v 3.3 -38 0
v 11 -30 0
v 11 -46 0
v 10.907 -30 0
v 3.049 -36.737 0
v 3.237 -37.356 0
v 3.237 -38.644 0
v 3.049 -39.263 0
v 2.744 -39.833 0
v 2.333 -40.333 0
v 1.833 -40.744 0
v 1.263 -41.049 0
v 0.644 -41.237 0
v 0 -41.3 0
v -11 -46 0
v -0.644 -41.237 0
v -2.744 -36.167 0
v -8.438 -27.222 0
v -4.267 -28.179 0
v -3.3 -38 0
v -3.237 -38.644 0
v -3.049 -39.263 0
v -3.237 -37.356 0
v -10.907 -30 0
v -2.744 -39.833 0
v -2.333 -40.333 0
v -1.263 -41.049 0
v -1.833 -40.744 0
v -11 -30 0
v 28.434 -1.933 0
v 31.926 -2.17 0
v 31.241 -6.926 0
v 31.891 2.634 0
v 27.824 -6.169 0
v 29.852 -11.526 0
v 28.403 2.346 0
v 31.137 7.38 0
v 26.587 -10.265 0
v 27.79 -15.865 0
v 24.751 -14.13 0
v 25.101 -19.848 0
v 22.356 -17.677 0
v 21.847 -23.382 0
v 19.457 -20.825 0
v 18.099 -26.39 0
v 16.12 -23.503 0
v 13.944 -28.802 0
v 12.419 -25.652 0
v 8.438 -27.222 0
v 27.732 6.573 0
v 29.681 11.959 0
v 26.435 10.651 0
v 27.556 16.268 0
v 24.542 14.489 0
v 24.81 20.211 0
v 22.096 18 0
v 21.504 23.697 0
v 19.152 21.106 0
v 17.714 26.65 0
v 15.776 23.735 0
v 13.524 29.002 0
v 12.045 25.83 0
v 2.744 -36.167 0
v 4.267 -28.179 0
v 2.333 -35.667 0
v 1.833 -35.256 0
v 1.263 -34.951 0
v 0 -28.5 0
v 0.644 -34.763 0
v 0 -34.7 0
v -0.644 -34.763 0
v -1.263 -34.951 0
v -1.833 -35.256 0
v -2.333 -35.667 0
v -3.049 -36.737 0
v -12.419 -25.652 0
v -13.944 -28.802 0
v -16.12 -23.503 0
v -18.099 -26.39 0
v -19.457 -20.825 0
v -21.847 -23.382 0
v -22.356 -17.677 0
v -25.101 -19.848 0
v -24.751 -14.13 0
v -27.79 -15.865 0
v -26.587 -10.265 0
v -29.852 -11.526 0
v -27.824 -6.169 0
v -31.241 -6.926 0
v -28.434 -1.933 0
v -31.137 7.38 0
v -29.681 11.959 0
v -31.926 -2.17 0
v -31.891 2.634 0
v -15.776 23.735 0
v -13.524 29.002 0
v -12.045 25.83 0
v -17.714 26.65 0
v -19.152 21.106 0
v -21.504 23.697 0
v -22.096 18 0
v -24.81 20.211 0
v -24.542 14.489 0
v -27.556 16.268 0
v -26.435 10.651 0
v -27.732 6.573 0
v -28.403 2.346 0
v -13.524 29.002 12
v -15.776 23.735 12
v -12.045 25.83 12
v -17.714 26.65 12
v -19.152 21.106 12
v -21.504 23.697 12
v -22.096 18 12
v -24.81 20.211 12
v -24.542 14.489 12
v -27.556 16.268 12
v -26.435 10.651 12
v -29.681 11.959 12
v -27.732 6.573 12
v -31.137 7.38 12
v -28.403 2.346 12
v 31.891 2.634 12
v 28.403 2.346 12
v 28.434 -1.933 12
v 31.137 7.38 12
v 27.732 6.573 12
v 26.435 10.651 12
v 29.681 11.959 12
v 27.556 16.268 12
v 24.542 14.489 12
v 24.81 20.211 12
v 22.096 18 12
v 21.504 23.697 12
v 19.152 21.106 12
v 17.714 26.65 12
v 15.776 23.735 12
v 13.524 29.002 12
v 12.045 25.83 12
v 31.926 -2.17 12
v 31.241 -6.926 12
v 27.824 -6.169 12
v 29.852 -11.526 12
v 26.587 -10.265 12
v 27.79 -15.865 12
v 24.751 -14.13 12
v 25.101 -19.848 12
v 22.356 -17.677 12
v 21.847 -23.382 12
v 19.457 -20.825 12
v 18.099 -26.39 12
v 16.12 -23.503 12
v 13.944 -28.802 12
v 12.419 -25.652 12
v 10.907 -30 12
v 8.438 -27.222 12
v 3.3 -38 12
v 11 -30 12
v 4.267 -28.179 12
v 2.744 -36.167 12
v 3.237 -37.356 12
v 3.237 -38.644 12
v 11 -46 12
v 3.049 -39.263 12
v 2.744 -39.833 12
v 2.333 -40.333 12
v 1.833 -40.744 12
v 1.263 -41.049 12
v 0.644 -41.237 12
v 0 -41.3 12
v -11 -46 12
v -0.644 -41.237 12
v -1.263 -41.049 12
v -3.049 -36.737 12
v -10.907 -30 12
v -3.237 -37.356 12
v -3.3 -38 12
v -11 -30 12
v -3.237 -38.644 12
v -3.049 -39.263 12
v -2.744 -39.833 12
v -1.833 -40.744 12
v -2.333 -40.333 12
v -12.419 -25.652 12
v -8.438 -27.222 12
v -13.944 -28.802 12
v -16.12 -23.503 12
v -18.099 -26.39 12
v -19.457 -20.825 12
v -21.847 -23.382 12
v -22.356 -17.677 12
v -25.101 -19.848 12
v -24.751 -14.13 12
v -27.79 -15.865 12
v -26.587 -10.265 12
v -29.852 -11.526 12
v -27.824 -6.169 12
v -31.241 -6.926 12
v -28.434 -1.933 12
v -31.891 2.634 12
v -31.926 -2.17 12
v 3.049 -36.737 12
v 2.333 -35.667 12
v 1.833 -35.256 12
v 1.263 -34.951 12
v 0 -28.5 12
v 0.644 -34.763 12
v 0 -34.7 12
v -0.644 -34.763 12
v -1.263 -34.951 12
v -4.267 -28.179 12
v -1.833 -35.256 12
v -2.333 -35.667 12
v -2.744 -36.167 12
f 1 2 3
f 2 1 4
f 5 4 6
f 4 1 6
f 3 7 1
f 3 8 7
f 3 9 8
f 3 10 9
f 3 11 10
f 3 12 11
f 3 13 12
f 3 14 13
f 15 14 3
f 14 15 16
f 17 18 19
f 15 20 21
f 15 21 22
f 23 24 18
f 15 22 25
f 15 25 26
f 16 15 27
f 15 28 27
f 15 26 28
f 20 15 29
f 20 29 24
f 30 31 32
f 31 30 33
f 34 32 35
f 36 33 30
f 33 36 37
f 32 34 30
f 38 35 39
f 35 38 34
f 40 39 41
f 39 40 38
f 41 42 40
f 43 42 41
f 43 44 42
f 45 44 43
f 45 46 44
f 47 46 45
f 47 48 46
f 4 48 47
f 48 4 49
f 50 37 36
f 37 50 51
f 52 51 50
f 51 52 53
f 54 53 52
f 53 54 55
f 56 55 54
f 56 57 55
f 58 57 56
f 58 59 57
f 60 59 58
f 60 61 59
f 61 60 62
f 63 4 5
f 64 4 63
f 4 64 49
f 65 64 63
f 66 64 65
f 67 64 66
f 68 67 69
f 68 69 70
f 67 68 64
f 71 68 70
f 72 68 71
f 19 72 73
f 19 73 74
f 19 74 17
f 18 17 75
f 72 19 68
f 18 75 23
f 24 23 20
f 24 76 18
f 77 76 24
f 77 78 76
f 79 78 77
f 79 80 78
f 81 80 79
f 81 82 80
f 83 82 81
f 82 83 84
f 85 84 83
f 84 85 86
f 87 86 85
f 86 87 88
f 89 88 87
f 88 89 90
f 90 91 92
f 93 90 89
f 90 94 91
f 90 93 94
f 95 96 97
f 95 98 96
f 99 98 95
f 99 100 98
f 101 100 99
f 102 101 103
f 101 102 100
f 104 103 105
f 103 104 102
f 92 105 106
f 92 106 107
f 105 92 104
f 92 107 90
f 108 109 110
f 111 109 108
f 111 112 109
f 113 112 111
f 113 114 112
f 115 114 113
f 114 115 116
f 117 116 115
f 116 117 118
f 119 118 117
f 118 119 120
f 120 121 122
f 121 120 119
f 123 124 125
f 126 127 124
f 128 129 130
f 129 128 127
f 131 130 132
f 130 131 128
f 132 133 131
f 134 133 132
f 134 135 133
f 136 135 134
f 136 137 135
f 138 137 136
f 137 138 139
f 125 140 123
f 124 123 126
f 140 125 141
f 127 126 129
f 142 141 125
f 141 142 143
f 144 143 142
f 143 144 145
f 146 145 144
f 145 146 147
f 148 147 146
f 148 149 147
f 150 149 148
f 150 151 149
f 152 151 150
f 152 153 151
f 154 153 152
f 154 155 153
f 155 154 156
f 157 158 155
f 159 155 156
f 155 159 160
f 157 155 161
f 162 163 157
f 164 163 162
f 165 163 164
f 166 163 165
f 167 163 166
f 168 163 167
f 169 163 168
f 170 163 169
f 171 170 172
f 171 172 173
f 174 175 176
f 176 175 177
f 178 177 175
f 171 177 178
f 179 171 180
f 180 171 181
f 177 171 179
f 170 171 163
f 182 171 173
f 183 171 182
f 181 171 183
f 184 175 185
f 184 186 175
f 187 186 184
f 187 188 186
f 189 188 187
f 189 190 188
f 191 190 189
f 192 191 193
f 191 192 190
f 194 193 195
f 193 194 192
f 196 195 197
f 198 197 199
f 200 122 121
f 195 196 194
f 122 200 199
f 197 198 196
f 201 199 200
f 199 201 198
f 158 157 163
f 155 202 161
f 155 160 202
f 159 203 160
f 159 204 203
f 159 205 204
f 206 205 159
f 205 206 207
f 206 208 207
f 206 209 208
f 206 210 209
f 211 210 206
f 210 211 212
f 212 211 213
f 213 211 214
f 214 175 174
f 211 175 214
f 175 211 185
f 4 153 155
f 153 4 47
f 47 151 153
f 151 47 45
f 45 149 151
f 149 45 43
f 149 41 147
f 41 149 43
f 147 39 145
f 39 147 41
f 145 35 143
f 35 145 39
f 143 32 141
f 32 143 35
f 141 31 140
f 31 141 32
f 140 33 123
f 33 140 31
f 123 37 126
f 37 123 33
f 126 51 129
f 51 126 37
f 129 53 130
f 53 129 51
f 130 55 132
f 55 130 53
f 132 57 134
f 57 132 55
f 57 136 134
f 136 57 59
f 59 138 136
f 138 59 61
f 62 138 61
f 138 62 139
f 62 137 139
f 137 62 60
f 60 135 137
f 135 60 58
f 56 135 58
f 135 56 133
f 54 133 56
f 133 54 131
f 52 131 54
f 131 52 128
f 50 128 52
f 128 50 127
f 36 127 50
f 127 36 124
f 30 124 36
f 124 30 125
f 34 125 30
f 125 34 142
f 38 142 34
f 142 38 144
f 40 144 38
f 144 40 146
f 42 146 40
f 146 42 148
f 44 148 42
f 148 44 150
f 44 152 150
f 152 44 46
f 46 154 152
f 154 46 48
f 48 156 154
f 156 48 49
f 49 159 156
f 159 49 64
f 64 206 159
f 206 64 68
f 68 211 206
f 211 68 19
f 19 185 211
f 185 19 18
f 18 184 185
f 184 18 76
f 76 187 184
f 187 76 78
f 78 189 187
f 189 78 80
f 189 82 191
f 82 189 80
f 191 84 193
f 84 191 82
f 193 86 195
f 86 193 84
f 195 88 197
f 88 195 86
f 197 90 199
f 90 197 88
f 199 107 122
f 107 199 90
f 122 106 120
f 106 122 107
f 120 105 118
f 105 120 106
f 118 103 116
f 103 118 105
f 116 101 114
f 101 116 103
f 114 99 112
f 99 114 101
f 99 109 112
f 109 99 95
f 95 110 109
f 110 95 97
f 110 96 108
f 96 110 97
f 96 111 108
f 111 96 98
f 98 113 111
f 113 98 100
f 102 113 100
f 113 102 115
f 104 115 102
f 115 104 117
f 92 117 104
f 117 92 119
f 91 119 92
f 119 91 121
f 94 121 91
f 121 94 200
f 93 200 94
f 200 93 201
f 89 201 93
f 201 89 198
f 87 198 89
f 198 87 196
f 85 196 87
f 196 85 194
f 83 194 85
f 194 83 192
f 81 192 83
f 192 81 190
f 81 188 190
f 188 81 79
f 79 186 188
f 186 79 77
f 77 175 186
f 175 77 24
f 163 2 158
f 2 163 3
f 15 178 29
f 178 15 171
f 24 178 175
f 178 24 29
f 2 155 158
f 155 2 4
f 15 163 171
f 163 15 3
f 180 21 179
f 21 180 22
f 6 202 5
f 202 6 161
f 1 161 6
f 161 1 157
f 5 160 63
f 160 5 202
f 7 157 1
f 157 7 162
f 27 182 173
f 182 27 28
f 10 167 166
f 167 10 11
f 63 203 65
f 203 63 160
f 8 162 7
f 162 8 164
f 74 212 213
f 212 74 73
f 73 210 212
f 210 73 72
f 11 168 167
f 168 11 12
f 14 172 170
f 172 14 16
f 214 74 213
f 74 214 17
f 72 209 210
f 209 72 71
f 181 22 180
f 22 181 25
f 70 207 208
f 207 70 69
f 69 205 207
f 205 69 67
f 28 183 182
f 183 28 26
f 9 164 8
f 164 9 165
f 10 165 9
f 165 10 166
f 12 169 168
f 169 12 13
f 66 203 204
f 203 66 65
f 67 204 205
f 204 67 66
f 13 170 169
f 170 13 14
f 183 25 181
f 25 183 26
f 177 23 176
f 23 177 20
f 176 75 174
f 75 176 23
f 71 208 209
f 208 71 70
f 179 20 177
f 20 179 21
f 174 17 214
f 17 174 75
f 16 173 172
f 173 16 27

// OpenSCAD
$fn = 32;

// ----------------------------------------------------------------------
// Spring clip: 64 mm outside, 3.5 mm band, 50 degree opening
// ----------------------------------------------------------------------

// --- parameters (mm) ---
outer_r = 32;             // clip outside radius
inner_r = 28.5;           // clip bore radius
band = 3.5;               // band thickness
clip_w = 12;              // clip width
opening = 50;             // opening angle
tab_w = 22;               // tab width
tab_len = 14;             // tab length past the clip
tab_hole = 6.6;           // tab fixing hole

clip_profile = [[-13.524, 29.002], [-17.714, 26.65], [-21.504, 23.697], [-24.81, 20.211], [-27.556, 16.268], [-29.681, 11.959], [-31.137, 7.38], [-31.891, 2.634], [-31.926, -2.17], [-31.241, -6.926], [-29.852, -11.526], [-27.79, -15.865], [-25.101, -19.848], [-21.847, -23.382], [-18.099, -26.39], [-13.944, -28.802], [-9.475, -30.565], [-4.791, -31.639], [0, -32], [4.791, -31.639], [9.475, -30.565], [13.944, -28.802], [18.099, -26.39], [21.847, -23.382], [25.101, -19.848], [27.79, -15.865], [29.852, -11.526], [31.241, -6.926], [31.926, -2.17], [31.891, 2.634], [31.137, 7.38], [29.681, 11.959], [27.556, 16.268], [24.81, 20.211], [21.504, 23.697], [17.714, 26.65], [13.524, 29.002], [12.045, 25.83], [15.776, 23.735], [19.152, 21.106], [22.096, 18], [24.542, 14.489], [26.435, 10.651], [27.732, 6.573], [28.403, 2.346], [28.434, -1.933], [27.824, -6.169], [26.587, -10.265], [24.751, -14.13], [22.356, -17.677], [19.457, -20.825], [16.12, -23.503], [12.419, -25.652], [8.438, -27.222], [4.267, -28.179], [0, -28.5], [-4.267, -28.179], [-8.438, -27.222], [-12.419, -25.652], [-16.12, -23.503], [-19.457, -20.825], [-22.356, -17.677], [-24.751, -14.13], [-26.587, -10.265], [-27.824, -6.169], [-28.434, -1.933], [-28.403, 2.346], [-27.732, 6.573], [-26.435, 10.651], [-24.542, 14.489], [-22.096, 18], [-19.152, 21.106], [-15.776, 23.735], [-12.045, 25.83]];

difference() {
  union() {
    linear_extrude(height = clip_w) polygon(clip_profile);
    /* mounting tab, sunk 2 mm into the band */
    translate([-11, -46, 0]) cube([tab_w, 16, clip_w]);
  }
  translate([0, -38, -2.5]) cylinder(h = clip_w + 5, d = tab_hole);
}
